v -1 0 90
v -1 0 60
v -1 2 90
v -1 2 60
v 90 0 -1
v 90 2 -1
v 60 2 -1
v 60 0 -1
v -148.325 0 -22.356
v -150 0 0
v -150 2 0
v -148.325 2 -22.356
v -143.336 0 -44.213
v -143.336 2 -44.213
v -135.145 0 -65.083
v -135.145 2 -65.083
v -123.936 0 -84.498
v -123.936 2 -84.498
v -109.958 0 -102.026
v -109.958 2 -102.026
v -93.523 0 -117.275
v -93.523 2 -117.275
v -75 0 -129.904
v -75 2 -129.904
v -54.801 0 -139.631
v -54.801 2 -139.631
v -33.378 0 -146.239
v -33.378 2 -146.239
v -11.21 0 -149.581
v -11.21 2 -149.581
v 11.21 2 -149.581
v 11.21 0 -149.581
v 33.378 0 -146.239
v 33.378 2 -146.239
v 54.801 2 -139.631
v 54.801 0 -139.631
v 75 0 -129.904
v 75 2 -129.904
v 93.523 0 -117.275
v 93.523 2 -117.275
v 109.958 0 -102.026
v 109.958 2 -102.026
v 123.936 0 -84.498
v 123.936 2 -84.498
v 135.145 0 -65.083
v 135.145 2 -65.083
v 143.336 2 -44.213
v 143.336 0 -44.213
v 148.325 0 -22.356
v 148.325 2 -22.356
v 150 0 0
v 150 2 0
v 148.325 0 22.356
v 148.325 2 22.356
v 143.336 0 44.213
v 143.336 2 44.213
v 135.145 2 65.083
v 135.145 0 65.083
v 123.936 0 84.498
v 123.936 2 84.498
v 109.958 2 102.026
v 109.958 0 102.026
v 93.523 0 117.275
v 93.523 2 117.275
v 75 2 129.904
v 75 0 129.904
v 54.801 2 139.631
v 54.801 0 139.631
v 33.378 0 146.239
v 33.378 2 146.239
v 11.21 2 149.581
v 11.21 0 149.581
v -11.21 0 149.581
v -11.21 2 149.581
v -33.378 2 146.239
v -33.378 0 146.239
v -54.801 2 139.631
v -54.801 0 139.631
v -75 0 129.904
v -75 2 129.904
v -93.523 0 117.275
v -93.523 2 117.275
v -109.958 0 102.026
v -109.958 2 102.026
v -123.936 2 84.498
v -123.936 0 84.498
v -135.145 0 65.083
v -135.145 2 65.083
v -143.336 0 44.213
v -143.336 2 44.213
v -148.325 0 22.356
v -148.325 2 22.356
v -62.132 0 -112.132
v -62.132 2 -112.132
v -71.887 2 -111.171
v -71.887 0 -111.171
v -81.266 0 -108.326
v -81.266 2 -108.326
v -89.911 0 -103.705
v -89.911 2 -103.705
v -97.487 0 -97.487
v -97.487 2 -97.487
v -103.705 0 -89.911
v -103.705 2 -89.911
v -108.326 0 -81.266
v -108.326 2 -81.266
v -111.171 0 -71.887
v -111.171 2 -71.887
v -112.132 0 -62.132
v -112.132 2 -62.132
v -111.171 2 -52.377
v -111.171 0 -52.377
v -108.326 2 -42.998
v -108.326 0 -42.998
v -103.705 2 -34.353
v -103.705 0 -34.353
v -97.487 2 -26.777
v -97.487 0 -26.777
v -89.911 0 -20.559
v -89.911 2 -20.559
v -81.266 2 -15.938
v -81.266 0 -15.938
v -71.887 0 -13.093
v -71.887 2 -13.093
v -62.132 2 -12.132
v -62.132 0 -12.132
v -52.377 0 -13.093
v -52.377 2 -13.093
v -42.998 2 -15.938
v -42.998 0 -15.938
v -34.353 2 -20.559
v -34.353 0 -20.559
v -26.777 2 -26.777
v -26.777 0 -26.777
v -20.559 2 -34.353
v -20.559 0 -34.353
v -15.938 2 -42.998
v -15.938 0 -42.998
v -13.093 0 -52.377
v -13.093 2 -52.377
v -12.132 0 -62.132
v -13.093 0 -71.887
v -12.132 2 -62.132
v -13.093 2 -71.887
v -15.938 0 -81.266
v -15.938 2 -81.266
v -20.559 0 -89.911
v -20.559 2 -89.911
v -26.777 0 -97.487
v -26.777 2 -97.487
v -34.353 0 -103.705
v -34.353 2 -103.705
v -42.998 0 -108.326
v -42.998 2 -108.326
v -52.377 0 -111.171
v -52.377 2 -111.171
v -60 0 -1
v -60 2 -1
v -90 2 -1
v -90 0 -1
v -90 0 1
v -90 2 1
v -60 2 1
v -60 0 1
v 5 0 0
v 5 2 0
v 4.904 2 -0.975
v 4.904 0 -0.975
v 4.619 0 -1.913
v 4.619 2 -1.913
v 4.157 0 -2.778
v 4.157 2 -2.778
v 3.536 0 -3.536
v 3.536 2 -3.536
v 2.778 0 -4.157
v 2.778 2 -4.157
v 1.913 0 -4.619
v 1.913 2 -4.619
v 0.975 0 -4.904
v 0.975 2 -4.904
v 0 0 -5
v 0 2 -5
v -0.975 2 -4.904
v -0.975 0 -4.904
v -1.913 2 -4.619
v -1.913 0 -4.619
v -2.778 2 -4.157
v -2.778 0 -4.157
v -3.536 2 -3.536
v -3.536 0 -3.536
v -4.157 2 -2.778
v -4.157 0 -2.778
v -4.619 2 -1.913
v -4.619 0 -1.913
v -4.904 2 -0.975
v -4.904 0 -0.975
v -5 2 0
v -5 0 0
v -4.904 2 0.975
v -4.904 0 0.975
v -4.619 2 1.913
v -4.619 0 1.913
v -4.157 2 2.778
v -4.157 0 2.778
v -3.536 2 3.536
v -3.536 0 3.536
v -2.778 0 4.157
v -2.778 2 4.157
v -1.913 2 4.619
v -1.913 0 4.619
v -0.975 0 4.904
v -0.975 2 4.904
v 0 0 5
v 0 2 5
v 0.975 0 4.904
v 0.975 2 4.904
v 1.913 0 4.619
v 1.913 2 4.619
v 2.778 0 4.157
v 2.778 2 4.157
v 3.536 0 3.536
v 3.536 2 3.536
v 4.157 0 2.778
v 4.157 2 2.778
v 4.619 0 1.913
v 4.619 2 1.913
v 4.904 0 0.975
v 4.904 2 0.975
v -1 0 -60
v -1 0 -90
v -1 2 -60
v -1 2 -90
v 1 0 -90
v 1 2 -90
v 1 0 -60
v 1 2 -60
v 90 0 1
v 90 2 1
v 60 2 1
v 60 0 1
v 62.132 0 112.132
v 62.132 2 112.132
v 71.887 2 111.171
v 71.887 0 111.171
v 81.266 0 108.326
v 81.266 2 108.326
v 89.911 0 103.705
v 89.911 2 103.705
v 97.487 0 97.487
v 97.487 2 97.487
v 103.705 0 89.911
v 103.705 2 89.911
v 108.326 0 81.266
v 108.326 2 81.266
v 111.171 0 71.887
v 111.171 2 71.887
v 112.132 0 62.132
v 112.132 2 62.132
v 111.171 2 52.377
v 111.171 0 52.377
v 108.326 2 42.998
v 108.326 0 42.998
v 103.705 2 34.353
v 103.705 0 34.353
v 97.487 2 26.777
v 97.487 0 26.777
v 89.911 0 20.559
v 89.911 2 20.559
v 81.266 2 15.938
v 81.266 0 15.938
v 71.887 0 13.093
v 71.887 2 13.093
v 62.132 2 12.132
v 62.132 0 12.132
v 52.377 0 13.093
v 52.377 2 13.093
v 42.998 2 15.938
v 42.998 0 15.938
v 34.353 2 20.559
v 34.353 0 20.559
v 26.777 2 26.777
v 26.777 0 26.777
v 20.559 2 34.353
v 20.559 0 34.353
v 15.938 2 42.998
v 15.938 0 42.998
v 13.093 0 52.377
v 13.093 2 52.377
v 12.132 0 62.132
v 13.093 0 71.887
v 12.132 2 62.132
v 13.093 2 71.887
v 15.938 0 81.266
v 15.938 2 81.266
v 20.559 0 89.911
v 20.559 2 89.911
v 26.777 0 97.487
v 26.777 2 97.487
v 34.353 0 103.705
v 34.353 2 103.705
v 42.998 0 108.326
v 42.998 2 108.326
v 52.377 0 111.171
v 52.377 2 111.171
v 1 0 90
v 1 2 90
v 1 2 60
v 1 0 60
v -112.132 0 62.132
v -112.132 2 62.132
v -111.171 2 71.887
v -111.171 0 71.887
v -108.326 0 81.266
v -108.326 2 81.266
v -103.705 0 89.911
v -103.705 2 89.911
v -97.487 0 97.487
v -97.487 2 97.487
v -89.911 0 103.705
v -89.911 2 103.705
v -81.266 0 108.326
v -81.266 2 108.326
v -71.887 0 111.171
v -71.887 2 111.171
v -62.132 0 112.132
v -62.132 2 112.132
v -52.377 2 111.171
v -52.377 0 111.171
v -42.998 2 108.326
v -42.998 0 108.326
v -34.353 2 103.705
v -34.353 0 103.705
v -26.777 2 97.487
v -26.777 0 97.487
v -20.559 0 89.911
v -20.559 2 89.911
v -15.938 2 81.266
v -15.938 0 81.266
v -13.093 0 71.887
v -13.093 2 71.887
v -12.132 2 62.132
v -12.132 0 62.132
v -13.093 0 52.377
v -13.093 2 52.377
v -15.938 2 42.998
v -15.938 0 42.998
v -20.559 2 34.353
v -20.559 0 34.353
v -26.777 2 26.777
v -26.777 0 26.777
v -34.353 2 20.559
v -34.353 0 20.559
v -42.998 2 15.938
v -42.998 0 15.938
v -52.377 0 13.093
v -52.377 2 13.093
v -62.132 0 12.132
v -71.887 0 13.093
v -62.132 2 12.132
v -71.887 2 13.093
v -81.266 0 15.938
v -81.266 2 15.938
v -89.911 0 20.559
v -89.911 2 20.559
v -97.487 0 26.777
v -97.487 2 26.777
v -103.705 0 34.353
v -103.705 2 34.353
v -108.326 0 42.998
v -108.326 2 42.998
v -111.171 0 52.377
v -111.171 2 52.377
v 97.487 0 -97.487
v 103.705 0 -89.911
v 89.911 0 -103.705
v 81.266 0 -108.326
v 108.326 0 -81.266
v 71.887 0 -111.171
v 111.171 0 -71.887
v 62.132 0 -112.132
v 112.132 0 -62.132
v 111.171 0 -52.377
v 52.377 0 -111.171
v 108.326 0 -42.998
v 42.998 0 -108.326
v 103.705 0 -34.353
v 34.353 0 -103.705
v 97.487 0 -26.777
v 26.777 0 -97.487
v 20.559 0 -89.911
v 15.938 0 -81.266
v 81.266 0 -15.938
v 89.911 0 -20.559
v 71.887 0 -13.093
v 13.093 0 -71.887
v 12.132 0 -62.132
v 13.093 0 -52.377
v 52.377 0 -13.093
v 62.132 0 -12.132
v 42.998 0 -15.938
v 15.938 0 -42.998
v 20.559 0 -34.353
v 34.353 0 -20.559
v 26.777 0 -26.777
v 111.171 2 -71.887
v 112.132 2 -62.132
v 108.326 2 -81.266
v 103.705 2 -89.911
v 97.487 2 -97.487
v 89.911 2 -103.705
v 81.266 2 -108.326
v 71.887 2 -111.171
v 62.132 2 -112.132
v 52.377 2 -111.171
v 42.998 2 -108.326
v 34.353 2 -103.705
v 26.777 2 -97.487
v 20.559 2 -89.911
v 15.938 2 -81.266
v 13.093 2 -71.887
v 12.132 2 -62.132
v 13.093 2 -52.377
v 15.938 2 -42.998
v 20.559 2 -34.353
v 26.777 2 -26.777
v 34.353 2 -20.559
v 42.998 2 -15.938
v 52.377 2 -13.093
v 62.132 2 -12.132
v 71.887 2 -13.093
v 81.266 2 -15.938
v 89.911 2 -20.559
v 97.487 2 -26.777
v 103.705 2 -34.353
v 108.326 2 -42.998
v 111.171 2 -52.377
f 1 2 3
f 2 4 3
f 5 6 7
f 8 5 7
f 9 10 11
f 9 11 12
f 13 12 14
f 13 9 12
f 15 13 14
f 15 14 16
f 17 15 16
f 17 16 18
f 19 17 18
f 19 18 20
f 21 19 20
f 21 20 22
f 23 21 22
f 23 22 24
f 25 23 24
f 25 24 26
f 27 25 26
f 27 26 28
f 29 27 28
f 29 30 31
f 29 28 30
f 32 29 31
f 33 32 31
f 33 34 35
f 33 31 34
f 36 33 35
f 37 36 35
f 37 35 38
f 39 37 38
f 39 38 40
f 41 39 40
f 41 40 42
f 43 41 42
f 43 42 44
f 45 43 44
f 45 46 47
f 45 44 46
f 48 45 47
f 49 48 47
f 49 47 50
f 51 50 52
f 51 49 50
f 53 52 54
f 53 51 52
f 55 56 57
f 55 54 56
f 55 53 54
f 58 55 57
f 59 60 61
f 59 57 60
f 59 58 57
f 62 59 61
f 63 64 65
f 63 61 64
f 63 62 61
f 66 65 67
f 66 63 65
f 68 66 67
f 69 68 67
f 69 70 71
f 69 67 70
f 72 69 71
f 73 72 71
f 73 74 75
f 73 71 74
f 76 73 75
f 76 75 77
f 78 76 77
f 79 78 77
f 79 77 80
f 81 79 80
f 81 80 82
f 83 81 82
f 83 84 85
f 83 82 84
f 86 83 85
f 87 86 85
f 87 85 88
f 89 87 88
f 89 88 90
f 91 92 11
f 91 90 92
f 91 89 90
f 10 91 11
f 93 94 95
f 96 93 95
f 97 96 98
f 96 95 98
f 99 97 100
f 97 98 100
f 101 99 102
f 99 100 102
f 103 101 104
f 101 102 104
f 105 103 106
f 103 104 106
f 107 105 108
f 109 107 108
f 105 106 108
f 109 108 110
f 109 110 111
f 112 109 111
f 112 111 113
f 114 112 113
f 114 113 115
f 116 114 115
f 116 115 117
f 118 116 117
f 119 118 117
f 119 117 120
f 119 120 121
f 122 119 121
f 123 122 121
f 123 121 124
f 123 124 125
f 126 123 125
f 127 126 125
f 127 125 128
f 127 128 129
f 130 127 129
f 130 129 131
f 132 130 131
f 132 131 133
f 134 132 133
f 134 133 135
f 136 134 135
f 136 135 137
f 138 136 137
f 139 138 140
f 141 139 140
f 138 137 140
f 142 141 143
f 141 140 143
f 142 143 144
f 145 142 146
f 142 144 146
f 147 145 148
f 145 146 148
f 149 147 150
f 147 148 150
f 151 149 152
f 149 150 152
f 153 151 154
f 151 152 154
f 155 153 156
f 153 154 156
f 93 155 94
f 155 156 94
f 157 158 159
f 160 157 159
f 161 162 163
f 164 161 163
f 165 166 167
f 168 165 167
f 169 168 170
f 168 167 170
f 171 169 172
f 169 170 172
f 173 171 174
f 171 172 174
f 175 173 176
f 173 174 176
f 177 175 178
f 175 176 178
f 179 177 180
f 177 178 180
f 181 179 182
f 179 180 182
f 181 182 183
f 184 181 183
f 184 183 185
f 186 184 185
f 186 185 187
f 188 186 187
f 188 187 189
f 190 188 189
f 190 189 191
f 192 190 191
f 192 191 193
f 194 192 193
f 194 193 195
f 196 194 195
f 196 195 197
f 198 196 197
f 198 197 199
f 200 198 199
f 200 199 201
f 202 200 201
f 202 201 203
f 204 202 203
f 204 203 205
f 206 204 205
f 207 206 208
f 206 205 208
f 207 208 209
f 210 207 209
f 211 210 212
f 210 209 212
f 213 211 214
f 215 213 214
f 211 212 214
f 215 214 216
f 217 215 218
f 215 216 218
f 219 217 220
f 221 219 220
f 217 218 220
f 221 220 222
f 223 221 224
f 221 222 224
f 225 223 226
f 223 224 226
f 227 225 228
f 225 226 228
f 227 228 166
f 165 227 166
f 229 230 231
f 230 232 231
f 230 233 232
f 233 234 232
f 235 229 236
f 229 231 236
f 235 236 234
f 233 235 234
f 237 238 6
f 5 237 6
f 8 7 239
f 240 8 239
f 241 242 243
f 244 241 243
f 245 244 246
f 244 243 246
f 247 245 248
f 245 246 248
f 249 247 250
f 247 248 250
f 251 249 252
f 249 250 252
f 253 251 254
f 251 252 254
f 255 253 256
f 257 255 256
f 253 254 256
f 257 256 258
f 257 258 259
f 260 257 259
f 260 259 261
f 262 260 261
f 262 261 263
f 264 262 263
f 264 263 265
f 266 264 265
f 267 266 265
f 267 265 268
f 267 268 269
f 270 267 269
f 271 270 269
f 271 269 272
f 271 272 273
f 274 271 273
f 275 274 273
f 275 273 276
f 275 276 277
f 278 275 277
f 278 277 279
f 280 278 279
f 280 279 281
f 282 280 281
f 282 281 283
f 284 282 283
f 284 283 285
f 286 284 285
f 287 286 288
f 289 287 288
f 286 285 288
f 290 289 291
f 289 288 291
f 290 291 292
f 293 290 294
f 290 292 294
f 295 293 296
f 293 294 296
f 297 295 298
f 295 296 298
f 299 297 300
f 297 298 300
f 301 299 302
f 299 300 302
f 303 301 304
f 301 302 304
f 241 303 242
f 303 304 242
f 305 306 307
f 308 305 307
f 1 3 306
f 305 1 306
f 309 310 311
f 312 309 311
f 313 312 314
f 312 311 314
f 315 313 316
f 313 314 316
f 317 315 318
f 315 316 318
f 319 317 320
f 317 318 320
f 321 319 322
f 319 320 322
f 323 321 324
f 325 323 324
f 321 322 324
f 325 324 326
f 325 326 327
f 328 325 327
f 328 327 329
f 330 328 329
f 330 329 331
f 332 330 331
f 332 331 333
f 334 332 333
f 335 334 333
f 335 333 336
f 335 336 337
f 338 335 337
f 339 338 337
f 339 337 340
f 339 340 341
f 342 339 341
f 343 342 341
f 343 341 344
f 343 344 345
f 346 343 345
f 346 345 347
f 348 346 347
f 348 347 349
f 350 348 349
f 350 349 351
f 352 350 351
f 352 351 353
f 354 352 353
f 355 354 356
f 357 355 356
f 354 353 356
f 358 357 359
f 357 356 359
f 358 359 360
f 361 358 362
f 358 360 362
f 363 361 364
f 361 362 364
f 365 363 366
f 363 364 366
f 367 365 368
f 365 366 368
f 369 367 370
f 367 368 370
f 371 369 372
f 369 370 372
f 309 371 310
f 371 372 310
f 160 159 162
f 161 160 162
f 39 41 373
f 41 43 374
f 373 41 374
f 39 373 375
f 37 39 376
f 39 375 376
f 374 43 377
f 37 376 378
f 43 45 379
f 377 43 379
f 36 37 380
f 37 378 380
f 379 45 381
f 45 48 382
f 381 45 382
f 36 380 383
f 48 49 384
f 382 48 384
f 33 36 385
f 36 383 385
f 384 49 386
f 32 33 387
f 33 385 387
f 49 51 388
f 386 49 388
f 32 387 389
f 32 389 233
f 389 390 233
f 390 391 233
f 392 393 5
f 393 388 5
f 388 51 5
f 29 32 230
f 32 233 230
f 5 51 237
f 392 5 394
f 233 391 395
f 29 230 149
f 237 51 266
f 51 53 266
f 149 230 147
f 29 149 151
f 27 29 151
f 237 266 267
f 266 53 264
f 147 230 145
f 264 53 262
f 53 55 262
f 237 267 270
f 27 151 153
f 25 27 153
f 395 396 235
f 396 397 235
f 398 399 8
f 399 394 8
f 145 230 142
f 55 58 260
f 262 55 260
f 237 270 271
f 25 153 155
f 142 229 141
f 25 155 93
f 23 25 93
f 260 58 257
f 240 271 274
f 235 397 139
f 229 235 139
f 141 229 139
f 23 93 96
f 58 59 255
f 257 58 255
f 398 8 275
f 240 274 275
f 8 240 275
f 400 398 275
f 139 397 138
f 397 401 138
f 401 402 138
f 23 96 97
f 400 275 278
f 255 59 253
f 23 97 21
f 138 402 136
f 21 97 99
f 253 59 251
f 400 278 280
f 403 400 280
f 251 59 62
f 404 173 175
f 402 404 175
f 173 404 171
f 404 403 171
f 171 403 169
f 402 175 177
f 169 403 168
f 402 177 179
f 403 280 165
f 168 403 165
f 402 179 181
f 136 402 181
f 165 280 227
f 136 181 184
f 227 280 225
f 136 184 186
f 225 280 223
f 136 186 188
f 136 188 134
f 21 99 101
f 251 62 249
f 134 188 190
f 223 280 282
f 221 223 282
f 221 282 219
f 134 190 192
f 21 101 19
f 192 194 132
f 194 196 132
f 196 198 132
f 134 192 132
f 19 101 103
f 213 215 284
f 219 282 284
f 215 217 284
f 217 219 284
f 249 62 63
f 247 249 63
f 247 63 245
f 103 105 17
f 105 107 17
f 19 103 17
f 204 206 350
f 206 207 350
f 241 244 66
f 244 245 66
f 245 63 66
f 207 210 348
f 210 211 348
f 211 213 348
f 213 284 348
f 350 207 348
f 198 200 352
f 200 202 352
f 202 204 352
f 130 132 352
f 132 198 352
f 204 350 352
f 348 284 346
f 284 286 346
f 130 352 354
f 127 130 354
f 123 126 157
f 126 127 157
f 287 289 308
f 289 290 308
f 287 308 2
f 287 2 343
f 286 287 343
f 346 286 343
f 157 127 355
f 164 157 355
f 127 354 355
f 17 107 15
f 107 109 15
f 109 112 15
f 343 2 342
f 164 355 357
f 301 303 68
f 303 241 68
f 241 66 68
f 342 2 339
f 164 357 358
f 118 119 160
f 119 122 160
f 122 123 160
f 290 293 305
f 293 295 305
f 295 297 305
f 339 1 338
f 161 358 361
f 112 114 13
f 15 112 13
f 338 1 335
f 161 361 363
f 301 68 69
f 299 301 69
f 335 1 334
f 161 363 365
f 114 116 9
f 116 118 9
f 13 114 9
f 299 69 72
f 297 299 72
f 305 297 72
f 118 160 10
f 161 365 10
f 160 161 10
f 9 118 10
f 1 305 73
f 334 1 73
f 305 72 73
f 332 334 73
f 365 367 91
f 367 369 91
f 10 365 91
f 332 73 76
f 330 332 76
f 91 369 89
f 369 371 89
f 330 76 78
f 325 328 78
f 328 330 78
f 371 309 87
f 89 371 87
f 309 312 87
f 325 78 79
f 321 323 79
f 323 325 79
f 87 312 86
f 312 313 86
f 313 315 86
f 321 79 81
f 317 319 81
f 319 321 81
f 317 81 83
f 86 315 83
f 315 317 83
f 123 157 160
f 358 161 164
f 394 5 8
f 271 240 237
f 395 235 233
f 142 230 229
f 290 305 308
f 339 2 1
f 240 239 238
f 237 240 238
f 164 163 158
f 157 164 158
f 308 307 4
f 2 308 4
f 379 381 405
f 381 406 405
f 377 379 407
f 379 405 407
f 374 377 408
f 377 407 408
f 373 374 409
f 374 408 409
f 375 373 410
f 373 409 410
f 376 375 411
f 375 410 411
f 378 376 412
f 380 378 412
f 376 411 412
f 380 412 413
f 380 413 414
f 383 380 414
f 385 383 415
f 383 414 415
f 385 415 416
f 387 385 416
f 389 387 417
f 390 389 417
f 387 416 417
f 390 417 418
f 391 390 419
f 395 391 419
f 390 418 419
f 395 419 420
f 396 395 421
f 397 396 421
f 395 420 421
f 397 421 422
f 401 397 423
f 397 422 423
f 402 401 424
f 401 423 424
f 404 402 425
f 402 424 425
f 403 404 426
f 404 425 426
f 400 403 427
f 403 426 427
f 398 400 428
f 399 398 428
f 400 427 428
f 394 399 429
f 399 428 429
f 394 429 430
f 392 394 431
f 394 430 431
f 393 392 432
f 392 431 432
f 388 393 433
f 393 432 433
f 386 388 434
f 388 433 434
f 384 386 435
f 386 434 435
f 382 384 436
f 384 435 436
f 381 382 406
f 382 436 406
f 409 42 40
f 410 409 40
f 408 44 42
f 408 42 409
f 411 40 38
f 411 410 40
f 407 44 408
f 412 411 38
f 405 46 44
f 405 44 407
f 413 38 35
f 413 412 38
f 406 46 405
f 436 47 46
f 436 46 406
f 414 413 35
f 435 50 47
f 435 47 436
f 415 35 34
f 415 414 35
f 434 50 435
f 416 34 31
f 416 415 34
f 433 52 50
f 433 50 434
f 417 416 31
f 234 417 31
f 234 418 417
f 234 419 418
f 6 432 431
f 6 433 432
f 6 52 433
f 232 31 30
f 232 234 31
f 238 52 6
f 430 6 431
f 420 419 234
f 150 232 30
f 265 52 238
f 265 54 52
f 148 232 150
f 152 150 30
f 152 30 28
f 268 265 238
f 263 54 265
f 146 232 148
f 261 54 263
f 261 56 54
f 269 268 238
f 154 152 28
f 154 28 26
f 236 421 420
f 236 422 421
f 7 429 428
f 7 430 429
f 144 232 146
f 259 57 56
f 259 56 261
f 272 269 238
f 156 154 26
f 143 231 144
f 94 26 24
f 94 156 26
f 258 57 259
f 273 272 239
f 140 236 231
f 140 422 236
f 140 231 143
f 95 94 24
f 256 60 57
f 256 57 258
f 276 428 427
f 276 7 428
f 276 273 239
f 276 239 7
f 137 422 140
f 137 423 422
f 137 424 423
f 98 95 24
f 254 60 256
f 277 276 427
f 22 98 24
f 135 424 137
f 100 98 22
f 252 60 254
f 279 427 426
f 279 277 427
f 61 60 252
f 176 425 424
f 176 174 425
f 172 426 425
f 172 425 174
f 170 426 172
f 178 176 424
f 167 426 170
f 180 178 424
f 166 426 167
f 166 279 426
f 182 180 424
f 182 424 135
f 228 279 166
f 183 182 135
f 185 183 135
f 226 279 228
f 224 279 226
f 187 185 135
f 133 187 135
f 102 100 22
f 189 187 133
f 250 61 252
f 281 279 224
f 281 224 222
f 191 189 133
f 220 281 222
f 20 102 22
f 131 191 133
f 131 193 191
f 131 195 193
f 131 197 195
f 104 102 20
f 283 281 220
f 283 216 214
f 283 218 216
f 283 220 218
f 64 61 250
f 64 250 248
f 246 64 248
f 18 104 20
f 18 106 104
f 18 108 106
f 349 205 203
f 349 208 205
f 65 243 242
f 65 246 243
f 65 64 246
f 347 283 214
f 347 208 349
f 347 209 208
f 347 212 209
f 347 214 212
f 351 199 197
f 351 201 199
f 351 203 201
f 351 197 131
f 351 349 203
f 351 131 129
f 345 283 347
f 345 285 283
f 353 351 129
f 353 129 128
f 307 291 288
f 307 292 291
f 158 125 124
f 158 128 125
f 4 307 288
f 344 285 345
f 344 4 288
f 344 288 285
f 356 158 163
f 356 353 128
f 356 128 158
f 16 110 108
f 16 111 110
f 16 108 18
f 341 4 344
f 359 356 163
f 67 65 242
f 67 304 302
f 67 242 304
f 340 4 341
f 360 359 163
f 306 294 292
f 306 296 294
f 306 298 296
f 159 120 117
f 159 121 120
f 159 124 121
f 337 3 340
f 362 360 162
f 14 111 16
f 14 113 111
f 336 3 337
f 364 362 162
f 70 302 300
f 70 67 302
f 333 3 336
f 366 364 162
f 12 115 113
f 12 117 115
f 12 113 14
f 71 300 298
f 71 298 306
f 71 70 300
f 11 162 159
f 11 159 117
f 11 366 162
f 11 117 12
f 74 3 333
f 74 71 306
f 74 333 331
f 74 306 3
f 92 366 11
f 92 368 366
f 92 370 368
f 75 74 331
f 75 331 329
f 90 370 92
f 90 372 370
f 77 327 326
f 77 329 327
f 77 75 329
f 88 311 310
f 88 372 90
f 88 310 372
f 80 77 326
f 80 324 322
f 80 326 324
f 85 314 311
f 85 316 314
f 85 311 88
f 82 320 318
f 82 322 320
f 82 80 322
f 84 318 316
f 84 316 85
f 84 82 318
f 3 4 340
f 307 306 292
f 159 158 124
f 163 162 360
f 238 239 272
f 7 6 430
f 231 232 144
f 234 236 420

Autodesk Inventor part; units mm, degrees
ref_plane "YZ Plane" through (0, 0, 0) normal (1, 0, 0) x (0, 1, 0)
ref_plane "XZ Plane" through (0, 0, 0) normal (0, 1, 0) x (-1, 0, 0)
ref_plane "XY Plane" through (0, 0, 0) normal (0, 0, 1) x (1, 0, 0)
sketch "Sketch1" plane through (0, 0, 0) normal (0, 1, 0) x (-1, 0, 0)
  circle A0 centre (0, 0) radius 150
  dimension "d0" = 300
extrude "Extrusion1" add sketch "Sketch1" along normal blind 2
sketch "Sketch2" plane through (0, 2, 0) normal (0, 1, 0) x (1, 0, 0)
  circle A0 centre (62.132, 62.132) radius 50
  circle A1 centre (0, 0) radius 150 construction
  line L0 (0, 150) -> (0, -150) construction
  line L1 (150, 0) -> (-150, 0) construction
  line L2 (62.132, 62.132) -> (0, 62.132) construction
  line L3 (62.132, 62.132) -> (62.132, 0) construction
  line L4 (62.132, 62.132) -> (106.066, 106.066) construction
  dimension "d3" = 100
  dimension "d26" = 62.132
extrude "Extrusion2" cut sketch "Sketch2" against normal through all
pattern_circular "Circular Pattern1" count 4 over 360 about axis through (0, -10, 0) along (0, 1, 0) of "Extrusion2"
sketch "Sketch3" plane through (0, 2, 0) normal (0, 1, 0) x (1, 0, 0)
  circle A0 centre (0, 0) radius 5
  dimension "d9" = 10
extrude "Extrusion3" cut sketch "Sketch3" against normal through all
sketch "Sketch5" plane through (0, 2, 0) normal (0, 1, 0) x (1, 0, 0)
  circle A0 centre (0, 0) radius 5 construction
  line L0 (0, 0) -> (-150, 0) construction
  arc A1 (-150, 0) -> (-150, 0) centre (0, 0) ccw construction
  line L1 (-60, -1) -> (-60, 1)
  line L2 (-60, 1) -> (-90, 1)
  line L3 (-90, 1) -> (-90, -1)
  line L4 (-90, -1) -> (-60, -1)
  line L5 (-60, 0) -> (-90, 0) construction
  point P0 (-75, 0)
  dimension "d19" = 2
  dimension "d20" = 30
extrude "Extrusion5" cut sketch "Sketch5" against normal through all
pattern_circular "Circular Pattern3" count 4 over 360 about axis through (0, -10, 0) along (0, 1, 0) of "Extrusion5"
properties part number "Plate" material "Aluminum 6061"
